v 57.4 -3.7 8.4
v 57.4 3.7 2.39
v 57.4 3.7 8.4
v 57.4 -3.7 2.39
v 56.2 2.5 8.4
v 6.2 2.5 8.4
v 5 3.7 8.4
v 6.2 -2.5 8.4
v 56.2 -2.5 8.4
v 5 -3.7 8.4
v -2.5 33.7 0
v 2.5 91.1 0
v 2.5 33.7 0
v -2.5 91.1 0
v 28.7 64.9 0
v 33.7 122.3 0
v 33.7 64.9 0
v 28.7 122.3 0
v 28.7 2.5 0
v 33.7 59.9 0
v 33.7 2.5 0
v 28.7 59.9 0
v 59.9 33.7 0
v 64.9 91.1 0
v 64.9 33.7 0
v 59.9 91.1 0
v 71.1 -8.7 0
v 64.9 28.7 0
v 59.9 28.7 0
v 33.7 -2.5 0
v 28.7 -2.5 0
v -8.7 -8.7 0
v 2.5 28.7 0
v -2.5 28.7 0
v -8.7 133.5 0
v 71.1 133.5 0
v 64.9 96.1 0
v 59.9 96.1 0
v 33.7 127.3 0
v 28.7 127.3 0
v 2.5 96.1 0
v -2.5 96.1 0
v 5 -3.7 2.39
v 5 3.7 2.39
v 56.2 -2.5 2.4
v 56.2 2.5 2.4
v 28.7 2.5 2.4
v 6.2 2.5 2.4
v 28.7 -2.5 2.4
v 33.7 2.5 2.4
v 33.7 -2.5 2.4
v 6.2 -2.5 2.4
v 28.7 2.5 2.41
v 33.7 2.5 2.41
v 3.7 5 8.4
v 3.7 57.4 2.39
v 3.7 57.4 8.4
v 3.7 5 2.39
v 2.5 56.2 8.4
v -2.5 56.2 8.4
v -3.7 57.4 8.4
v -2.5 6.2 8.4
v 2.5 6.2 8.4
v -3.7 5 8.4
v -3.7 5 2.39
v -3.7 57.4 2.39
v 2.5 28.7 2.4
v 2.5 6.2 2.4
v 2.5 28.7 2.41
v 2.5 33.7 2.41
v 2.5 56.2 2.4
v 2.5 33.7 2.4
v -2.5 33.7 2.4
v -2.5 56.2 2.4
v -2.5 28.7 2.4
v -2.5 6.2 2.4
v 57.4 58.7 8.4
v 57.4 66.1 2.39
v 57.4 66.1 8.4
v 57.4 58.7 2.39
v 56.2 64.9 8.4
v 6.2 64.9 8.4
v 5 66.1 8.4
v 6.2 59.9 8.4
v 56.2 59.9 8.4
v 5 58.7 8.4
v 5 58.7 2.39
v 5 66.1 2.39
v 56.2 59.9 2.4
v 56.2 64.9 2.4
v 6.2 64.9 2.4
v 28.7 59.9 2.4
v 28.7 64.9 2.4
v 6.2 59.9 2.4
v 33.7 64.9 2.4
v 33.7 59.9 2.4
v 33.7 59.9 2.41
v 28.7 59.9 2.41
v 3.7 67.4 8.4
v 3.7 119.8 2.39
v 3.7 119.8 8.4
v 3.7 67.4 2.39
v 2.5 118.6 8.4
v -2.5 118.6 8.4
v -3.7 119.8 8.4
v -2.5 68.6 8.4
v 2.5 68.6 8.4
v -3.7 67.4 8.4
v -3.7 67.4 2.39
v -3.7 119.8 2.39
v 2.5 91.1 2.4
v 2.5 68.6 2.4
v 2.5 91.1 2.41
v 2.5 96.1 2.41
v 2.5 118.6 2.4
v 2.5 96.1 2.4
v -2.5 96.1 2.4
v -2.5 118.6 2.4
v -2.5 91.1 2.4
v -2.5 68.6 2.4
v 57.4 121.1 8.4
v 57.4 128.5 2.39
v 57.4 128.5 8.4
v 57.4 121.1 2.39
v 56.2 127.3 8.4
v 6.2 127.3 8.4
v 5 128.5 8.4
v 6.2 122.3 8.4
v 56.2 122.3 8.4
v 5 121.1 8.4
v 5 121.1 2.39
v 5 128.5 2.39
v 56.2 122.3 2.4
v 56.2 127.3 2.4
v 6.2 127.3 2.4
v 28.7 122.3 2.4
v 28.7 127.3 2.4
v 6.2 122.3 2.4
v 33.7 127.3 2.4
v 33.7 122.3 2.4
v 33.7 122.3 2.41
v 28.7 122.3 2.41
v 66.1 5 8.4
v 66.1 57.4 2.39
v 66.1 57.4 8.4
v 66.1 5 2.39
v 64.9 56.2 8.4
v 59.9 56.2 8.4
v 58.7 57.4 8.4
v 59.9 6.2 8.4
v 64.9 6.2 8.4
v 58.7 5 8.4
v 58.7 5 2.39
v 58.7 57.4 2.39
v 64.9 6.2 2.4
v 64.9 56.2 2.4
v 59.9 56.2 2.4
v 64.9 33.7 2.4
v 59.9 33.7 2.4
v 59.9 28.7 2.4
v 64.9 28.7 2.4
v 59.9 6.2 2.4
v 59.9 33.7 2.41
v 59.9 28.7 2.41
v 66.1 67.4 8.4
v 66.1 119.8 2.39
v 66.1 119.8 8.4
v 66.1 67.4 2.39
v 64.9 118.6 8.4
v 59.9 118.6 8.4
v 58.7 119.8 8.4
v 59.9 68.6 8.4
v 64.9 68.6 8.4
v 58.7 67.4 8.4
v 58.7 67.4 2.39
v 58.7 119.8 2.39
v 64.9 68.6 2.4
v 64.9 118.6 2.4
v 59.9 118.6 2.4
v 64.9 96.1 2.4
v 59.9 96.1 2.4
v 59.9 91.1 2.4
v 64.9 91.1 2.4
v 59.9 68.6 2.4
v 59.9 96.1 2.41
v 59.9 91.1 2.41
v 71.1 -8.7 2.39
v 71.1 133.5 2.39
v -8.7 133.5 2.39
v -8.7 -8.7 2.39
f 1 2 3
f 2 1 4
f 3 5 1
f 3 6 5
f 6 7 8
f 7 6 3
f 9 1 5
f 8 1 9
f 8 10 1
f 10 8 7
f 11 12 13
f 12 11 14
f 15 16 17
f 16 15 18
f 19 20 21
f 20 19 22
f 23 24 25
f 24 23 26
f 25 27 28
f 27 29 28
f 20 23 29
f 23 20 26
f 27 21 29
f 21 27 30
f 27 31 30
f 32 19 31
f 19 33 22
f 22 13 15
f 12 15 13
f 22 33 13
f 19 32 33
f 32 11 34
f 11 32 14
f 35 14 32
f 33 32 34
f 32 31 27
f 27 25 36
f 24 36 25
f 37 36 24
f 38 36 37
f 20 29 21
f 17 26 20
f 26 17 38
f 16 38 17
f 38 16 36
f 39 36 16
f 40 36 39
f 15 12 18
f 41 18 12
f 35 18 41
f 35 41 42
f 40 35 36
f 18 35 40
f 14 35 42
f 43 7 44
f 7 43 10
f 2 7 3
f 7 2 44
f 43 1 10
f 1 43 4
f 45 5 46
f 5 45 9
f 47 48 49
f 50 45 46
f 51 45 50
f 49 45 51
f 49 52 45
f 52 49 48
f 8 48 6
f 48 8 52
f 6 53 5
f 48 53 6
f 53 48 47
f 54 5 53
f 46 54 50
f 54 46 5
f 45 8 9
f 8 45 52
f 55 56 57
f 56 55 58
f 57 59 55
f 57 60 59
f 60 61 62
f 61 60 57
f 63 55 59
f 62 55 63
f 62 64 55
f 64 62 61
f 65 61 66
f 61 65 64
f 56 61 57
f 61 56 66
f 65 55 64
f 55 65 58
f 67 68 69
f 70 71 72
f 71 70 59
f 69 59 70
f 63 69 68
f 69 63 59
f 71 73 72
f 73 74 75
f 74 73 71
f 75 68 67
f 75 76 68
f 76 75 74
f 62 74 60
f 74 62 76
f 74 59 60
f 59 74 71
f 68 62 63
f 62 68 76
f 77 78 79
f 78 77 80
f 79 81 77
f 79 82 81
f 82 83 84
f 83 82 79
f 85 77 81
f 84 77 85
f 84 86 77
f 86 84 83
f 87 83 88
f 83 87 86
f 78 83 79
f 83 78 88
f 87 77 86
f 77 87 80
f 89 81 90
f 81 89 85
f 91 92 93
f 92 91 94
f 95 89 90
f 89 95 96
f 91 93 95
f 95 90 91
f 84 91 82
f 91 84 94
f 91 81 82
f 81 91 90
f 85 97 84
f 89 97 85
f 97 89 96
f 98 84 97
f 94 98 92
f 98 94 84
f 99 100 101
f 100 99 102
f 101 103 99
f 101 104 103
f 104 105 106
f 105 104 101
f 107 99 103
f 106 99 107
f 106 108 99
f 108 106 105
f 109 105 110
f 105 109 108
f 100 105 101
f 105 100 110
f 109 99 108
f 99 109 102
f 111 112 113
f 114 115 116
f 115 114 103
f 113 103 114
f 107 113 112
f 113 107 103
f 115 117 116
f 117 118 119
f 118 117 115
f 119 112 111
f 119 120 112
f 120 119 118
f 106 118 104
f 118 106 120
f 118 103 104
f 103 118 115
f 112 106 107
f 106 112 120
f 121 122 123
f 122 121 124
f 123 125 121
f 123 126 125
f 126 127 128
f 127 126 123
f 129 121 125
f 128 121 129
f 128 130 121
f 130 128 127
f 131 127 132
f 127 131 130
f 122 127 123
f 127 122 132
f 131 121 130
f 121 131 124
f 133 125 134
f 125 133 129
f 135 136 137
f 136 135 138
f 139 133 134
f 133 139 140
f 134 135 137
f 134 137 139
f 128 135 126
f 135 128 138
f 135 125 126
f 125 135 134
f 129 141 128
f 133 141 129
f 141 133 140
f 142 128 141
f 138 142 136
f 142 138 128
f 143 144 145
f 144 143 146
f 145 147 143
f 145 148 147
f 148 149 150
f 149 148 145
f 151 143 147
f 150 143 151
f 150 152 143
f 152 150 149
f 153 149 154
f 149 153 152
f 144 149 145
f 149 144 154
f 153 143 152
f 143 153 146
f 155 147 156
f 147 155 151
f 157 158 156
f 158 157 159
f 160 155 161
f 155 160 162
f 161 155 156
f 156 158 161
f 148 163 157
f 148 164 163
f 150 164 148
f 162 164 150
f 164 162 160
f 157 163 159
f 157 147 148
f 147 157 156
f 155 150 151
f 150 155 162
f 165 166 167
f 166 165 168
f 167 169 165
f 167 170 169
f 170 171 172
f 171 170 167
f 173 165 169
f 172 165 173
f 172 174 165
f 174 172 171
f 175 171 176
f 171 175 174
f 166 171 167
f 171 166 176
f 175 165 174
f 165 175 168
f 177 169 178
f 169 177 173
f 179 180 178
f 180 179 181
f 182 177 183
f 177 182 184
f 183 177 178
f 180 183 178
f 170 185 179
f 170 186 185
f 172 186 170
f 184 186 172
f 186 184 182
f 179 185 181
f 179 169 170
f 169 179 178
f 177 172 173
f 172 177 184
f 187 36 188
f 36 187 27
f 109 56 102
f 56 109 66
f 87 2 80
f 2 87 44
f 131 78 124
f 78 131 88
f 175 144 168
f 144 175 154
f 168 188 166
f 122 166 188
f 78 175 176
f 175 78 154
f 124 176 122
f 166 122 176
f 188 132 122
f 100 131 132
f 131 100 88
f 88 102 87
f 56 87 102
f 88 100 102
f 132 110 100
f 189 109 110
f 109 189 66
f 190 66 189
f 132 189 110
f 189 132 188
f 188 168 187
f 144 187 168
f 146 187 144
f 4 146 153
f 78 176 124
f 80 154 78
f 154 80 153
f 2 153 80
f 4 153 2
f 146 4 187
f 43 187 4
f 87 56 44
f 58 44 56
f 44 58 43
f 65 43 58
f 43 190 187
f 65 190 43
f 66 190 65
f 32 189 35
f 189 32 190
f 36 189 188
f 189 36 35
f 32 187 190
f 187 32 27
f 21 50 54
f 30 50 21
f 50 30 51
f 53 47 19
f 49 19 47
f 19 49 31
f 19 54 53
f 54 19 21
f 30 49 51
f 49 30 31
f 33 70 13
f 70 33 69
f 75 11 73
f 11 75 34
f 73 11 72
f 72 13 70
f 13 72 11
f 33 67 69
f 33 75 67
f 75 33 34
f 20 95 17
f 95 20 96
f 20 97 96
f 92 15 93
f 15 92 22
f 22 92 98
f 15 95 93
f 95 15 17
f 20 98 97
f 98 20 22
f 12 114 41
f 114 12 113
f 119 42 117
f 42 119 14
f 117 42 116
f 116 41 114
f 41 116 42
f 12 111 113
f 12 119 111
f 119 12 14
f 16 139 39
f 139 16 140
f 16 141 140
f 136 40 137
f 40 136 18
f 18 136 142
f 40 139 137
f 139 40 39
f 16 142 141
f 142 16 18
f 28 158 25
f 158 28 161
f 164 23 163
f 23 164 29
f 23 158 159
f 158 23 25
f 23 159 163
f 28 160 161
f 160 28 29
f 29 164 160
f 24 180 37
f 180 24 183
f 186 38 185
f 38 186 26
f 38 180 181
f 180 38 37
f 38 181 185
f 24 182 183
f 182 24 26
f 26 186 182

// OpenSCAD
// OpenSCAD LED neon 7 segment display plate
// 
// A plate with slots for pieces of LED neon
// as segments of a 7-segment display

//Height of a single vertical segment
segh = 50;

//Width of a horizontal segment
segw = 50;

//Thickness of lines of the segment
//i.e., LED neon tape width
segt = 5;

//Gap between segments
segg = 5;

//Depth of the slots
segd = 6;

//Hole offset horizontal
hoh = 25;

//Hole offset vertical
hov = 25;

//Floor height
fl = 2.4;

//Slot wall thickness
wt = 1.2;

//Border top and bottom
btb = 5;

//Border left and right
blr = 5;

///////////////////////////
//Z-fight
zf = 0.01;

sh=segh+2*wt;
sw=segw+2*wt;
st=segt+2*wt;


module onesegh() {
    difference() {
        cube([segw+2*wt, segt+2*wt, segd+fl]);
        translate([wt,wt,fl])
            cube([segw, segt, segd+zf]);
    }

}

module holeh() {
    translate([wt+hoh-segt/2,wt,-zf])
        cube([segt, segt, fl+2*zf]);           
}

module onesegv() {
    difference() {
        cube([segt+2*wt, segh+2*wt, segd+fl]);
        translate([wt,wt,fl])
            cube([segt, segh, segd+zf]);
    }
}

module holev() {
    translate([wt,wt+hov-segt/2,-zf])
        cube([segt, segt, fl+2*zf]);
}

module sevensegplate() {
    translate([segg,-st/2,0])
        onesegh();
    translate([-st/2,segg,0])
        onesegv();
    translate([segg,sh+2*segg-st/2,0])
        onesegh();
    translate([-st/2,sh+3*segg,0])
        onesegv();
    translate([segg,2*sh+4*segg-st/2,0])
        onesegh();
    translate([sw+2*segg-st/2,segg,0])
        onesegv();
    translate([sw+2*segg-st/2,sh+3*segg,0])
        onesegv();
    translate([-st/2-blr,-st/2-btb,0])
        cube([2*blr+st+sw+2*segg,2*btb+st+2*sh+4*segg,fl-zf]);
}

module drillholes() {
    translate([segg,-st/2,0])
        holeh();
    translate([-st/2,segg,0])
        holev();
    translate([segg,sh+2*segg-st/2,0])
        holeh();
    translate([-st/2,sh+3*segg,0])
        holev();
    translate([segg,2*sh+4*segg-st/2,0])
        holeh();
    translate([sw+2*segg-st/2,segg,0])
        holev();
    translate([sw+2*segg-st/2,sh+3*segg,0])
        holev();
}

difference() {
    sevensegplate();
    drillholes();
}
